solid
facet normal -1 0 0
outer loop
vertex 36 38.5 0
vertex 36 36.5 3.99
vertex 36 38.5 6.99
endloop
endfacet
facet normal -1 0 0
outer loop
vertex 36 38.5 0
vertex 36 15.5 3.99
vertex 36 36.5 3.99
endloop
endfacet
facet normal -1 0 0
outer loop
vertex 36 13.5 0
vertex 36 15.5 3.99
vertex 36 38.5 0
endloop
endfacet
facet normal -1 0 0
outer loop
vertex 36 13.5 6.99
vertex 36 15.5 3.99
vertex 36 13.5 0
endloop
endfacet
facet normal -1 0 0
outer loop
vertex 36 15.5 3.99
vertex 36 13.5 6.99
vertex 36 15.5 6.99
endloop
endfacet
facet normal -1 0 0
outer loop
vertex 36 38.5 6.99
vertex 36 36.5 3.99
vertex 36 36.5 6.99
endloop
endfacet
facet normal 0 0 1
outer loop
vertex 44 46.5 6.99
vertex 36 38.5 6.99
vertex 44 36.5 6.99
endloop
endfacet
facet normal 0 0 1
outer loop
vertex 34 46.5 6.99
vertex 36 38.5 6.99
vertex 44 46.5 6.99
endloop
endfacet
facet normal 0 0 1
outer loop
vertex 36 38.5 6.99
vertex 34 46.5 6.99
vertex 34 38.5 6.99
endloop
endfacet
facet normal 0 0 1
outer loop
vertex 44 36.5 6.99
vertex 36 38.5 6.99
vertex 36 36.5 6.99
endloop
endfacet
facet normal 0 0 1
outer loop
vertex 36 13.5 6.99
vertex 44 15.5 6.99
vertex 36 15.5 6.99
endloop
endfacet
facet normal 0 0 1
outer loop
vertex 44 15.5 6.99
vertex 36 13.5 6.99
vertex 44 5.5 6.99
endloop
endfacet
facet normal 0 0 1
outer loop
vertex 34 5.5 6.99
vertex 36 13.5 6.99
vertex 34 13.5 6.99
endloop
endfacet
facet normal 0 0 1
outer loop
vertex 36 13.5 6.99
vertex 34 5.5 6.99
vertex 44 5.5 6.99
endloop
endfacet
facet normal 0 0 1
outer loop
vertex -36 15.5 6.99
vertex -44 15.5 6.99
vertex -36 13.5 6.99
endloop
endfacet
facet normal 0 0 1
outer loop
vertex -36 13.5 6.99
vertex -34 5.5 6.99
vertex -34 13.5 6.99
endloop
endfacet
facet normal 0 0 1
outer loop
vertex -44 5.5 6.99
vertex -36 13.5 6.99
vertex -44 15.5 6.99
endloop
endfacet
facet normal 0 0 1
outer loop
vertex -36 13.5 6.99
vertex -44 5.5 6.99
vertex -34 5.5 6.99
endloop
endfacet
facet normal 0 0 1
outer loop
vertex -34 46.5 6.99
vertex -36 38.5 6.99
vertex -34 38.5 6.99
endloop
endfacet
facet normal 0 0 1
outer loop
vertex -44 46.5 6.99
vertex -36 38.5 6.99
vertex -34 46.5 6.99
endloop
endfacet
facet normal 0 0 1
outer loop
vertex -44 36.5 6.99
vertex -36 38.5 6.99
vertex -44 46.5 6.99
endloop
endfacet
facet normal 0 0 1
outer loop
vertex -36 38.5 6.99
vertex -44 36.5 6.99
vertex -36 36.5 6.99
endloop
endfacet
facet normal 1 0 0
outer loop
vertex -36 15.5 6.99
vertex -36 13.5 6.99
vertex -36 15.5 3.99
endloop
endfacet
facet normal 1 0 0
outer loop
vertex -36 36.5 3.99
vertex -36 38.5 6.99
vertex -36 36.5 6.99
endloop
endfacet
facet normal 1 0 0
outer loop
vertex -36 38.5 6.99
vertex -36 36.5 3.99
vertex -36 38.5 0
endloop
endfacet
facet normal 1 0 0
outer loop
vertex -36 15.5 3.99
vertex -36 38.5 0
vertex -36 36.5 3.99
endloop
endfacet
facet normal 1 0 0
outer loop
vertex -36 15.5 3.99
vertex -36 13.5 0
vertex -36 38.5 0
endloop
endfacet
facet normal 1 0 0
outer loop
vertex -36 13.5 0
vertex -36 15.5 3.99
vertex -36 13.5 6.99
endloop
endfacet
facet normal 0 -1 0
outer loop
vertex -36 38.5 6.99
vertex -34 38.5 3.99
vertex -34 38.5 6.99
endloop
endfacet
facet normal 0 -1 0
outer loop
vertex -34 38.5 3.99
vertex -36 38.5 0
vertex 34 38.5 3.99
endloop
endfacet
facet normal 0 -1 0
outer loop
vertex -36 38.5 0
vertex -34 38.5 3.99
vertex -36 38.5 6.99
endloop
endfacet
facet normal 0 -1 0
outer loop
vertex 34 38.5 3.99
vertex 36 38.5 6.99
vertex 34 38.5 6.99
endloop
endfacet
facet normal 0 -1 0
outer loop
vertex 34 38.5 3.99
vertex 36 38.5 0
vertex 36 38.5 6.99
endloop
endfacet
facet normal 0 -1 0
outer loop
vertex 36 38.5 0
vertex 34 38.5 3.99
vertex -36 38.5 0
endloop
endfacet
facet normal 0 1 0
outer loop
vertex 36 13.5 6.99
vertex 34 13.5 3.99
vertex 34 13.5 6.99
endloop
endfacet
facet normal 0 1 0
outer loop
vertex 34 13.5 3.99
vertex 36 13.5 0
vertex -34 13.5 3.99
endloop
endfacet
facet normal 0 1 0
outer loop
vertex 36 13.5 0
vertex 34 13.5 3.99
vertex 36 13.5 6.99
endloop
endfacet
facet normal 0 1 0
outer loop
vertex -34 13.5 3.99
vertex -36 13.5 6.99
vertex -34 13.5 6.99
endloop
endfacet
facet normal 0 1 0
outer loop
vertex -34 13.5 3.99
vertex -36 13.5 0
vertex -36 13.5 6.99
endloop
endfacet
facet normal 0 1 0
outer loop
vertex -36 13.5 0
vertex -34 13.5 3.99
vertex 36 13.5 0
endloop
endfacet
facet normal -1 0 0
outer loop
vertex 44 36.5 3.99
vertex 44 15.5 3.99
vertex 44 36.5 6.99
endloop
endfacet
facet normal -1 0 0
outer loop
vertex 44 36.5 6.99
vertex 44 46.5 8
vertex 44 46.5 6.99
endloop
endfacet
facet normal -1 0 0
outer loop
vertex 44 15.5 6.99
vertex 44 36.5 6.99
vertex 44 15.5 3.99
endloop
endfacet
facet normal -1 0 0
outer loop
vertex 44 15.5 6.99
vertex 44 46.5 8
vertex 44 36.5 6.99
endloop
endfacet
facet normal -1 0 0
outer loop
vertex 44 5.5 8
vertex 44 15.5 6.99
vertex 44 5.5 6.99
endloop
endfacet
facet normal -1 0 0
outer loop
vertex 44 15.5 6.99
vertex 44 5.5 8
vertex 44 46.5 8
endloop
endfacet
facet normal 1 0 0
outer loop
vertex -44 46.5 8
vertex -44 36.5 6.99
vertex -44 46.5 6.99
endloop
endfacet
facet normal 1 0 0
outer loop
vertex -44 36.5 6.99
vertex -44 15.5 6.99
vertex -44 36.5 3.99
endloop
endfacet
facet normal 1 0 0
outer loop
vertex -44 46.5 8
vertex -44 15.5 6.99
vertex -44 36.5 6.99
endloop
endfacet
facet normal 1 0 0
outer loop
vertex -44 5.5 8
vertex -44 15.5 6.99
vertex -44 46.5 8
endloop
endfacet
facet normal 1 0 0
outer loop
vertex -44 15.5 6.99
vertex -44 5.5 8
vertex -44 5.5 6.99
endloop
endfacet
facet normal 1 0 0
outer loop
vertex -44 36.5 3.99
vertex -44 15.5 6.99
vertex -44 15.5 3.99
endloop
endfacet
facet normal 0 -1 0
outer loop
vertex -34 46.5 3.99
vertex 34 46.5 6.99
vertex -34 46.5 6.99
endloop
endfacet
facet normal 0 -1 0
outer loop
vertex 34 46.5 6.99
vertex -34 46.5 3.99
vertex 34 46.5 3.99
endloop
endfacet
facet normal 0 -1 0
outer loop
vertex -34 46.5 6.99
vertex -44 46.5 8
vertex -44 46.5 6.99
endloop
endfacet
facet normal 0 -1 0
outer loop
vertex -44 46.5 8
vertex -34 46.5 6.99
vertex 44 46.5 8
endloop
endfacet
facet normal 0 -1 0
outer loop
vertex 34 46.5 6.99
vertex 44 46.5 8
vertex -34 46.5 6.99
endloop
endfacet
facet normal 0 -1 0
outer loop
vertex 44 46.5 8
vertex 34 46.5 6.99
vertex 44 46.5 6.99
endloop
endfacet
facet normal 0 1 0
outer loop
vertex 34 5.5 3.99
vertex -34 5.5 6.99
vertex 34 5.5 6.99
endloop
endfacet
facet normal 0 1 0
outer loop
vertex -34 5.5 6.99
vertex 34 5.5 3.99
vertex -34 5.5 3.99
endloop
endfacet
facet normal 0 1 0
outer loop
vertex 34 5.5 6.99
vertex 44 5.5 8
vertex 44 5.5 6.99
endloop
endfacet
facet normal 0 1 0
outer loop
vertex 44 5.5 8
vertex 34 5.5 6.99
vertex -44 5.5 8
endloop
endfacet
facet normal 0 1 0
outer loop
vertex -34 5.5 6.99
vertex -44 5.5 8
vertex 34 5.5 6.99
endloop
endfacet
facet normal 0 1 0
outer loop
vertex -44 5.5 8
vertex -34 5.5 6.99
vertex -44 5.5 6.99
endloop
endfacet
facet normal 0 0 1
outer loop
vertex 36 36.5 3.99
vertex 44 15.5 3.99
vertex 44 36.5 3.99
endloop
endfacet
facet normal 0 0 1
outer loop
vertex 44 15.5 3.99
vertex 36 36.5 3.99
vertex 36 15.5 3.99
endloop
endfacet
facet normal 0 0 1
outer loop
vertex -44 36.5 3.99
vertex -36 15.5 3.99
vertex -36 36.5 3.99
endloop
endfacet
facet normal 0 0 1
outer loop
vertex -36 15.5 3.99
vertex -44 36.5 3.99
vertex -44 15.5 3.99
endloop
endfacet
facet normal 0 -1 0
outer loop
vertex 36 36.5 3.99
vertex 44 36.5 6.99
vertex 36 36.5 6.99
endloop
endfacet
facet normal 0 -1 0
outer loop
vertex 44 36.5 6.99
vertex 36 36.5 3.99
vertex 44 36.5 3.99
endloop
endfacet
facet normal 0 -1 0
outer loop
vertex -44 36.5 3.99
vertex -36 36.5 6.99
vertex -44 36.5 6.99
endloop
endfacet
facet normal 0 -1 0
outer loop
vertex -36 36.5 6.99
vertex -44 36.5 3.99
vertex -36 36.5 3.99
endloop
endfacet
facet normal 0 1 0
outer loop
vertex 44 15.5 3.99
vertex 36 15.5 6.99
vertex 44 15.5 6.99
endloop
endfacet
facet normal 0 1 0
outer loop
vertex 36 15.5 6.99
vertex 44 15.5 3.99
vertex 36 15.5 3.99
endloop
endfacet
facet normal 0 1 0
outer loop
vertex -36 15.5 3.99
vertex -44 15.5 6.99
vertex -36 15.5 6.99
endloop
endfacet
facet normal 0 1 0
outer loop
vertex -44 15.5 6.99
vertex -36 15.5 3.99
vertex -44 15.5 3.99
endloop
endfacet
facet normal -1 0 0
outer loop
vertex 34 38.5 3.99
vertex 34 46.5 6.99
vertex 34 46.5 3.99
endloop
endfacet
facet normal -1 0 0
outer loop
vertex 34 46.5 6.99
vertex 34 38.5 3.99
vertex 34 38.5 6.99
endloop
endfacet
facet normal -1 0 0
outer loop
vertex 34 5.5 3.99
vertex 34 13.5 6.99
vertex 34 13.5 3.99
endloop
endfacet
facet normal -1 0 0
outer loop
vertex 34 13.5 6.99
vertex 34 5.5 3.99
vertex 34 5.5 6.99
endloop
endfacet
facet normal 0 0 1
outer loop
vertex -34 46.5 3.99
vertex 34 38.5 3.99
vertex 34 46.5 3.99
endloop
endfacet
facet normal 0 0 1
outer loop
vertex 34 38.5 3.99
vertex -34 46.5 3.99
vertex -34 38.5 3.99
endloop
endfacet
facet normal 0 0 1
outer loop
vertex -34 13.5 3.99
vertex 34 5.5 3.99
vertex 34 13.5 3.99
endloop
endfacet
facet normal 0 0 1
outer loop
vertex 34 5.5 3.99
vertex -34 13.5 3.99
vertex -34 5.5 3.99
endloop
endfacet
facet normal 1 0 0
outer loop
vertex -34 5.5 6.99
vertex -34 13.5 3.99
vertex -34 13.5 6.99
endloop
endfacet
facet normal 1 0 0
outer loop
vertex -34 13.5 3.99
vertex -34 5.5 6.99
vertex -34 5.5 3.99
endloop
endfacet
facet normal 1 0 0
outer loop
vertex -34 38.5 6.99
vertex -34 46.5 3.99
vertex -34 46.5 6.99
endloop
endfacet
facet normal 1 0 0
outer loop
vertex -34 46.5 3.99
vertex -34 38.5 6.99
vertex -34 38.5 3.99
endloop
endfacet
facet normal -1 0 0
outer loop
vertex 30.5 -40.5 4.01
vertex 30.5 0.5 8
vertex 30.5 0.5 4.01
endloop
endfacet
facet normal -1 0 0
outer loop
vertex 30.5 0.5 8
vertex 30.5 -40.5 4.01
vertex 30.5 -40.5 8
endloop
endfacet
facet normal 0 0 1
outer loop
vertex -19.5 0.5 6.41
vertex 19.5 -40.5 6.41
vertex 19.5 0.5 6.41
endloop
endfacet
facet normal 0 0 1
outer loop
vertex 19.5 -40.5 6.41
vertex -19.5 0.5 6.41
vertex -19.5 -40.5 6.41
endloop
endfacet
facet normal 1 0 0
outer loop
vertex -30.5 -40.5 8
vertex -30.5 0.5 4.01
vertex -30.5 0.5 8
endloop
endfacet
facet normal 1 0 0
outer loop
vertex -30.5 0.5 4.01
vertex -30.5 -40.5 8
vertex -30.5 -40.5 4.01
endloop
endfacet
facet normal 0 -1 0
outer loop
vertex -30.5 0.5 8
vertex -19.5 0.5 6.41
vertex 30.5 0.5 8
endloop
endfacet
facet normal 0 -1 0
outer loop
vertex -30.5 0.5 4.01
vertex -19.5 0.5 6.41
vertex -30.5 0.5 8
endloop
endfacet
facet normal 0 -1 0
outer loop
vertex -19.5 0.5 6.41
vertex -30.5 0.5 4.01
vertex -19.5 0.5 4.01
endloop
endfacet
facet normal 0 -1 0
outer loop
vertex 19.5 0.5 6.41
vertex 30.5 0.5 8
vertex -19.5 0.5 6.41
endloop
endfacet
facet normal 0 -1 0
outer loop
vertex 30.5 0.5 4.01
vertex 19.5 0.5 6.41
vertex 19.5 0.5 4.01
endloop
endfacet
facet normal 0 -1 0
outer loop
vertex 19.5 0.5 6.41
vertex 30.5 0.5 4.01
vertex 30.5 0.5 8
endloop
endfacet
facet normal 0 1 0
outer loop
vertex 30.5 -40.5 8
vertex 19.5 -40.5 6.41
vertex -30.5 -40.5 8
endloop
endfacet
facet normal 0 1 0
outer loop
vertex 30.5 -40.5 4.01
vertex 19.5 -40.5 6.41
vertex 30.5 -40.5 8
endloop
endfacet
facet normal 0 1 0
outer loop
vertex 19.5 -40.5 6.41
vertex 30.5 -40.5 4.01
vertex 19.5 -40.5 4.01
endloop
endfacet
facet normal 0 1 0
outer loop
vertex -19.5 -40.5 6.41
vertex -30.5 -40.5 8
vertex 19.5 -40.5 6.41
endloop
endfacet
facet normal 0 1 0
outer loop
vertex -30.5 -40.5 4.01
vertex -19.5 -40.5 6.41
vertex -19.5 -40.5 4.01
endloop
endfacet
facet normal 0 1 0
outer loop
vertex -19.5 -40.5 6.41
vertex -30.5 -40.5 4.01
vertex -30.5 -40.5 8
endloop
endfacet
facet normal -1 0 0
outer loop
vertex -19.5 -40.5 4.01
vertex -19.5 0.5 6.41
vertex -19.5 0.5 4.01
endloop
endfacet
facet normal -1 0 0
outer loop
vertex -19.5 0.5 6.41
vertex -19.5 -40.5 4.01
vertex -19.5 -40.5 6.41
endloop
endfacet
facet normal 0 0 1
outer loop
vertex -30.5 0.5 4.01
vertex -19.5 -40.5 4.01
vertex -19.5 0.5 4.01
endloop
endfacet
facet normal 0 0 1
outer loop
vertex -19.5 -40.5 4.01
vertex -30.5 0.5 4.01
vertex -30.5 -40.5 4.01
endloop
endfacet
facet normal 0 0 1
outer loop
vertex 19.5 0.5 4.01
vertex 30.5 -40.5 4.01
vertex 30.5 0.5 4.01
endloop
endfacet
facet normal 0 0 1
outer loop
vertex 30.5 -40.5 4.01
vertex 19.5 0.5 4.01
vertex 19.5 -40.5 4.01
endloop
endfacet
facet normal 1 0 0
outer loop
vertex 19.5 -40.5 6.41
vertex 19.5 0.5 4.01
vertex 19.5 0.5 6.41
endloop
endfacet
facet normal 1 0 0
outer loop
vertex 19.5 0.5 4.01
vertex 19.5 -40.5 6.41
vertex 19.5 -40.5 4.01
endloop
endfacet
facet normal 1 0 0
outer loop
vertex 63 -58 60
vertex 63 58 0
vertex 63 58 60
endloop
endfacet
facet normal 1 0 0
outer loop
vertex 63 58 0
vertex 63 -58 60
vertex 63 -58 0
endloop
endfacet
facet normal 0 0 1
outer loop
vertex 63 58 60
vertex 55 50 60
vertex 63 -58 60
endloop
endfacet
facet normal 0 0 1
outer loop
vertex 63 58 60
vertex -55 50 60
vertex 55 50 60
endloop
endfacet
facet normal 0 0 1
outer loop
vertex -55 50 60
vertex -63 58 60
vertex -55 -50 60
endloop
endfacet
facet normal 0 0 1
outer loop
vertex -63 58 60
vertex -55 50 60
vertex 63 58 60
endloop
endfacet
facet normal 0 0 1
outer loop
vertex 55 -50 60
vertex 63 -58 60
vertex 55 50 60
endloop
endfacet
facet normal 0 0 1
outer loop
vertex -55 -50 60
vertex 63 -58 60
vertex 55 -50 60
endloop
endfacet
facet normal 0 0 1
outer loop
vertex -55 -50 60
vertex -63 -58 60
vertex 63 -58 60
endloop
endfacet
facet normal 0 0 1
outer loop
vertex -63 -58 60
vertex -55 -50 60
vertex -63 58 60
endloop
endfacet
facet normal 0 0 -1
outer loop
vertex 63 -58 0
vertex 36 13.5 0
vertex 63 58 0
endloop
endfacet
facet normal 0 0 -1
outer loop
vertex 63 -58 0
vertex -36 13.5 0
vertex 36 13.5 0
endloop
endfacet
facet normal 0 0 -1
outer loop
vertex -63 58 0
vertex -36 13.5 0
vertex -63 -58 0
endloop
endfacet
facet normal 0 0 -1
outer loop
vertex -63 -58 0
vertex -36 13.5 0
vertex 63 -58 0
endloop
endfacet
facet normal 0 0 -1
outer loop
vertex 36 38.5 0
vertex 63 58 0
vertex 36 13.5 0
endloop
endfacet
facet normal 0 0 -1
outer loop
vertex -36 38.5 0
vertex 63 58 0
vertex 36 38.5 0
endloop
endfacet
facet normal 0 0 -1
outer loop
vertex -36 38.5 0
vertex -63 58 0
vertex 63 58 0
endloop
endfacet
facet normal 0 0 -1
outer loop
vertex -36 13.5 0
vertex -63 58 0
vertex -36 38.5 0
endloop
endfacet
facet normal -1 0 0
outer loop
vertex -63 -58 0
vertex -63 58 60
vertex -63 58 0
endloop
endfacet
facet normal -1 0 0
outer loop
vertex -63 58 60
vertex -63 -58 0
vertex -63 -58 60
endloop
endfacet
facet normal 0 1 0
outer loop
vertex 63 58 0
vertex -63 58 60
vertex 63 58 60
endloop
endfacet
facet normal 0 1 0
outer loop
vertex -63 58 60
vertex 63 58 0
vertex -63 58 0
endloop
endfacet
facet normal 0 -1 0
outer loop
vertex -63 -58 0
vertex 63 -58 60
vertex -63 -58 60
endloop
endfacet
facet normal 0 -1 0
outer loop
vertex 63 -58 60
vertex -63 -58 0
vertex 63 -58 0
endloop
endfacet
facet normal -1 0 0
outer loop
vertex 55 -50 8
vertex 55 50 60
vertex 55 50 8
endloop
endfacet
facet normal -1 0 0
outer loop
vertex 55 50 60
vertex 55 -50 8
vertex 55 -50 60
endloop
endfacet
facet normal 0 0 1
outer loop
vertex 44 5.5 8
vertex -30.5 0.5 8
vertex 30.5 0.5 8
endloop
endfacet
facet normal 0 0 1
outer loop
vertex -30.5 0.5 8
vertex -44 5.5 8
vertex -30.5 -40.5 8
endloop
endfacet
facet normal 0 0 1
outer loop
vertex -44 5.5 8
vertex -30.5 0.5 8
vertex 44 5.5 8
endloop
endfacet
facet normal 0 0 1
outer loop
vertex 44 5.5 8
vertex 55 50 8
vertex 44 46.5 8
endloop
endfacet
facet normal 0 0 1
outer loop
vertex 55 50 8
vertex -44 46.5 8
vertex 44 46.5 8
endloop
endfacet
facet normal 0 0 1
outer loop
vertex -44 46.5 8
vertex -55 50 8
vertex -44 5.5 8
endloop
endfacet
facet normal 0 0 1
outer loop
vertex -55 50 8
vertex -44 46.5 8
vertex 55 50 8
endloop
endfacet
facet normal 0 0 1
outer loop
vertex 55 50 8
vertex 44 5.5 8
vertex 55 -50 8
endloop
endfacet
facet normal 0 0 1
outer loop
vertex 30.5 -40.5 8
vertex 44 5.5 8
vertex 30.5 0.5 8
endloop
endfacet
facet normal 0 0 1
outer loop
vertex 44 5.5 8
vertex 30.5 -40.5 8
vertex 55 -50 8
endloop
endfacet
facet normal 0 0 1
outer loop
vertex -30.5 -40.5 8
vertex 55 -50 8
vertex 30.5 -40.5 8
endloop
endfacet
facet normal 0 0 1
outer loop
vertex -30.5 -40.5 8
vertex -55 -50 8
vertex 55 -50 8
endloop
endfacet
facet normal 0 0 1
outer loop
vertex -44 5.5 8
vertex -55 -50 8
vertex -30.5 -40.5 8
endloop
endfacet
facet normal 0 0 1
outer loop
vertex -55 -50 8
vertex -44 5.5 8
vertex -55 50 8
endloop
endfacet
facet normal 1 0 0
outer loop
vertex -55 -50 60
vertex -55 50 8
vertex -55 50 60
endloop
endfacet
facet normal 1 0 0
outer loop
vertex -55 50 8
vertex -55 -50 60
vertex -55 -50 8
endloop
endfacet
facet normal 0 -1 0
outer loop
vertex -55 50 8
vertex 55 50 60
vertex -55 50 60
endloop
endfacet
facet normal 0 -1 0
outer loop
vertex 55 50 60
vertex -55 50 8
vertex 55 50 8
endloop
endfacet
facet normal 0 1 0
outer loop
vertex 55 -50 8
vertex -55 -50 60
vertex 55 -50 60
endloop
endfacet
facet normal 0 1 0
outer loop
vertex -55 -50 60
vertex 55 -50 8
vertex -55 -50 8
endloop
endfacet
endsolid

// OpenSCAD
$fn = 100; 

module display_cut(){
    width = 72;
    height = 25;
    depth = 7;
    translate([-width/2, -height/2, 0]) cube([width, height, depth]);

    border = 8;
    top_width = width + 2*border;
    top_height = height + 2*border;
    top_thick = 10;
    translate([-top_width/2, -top_height/2, depth]) cube([top_width, top_height, top_thick]);

    step = 4;
    step_width = width-4;
    step_height = height-4;
    translate([-top_width/2, -step_height/2, step]) cube([top_width, step_height, top_thick]);
    translate([-step_width/2, -top_height/2, step]) cube([step_width, top_height, top_thick]);
}

module reader_dent(){
    width = 60 + 1;
    height = 40 + 1;
    depth = 1.6;
    pin_depth = 4;
    pin_width = 11;
    translate([-width/2, -height/2, -depth]) cube([width, height, depth]);
    translate([-width/2, -height/2, -pin_depth]) cube([pin_width, height, pin_depth]);
    translate([width/2-pin_width, -height/2, -pin_depth]) cube([pin_width, height, pin_depth]);
}

module case_front(){
    wall = 8;
    inner_width = 110;
    width = inner_width + 2*wall;
    inner_height = 100;
    height = inner_height + 2*wall;
    depth = 60;
    
    difference(){
        translate([-width/2, -height/2, 0]) cube([width, height, depth]);
        translate([-inner_width/2, -inner_height/2, wall]) cube([inner_width, inner_height, depth-wall+0.01]);
        translate([0, 26, -0.01]) display_cut();
        translate([0, -20, 8.01]) reader_dent();
    }
}

case_front();

/*
difference(){
    translate([-40, -75, 0]) cube([80, 150, 30]);
    translate([-32, -67, 8]) cube([64, 134, 23]);
    translate([-25, 40, -1]) cube([50, 15, 10]);
    translate([-30, 38, 5]) cube([60, 19, 5]);
}

*/
